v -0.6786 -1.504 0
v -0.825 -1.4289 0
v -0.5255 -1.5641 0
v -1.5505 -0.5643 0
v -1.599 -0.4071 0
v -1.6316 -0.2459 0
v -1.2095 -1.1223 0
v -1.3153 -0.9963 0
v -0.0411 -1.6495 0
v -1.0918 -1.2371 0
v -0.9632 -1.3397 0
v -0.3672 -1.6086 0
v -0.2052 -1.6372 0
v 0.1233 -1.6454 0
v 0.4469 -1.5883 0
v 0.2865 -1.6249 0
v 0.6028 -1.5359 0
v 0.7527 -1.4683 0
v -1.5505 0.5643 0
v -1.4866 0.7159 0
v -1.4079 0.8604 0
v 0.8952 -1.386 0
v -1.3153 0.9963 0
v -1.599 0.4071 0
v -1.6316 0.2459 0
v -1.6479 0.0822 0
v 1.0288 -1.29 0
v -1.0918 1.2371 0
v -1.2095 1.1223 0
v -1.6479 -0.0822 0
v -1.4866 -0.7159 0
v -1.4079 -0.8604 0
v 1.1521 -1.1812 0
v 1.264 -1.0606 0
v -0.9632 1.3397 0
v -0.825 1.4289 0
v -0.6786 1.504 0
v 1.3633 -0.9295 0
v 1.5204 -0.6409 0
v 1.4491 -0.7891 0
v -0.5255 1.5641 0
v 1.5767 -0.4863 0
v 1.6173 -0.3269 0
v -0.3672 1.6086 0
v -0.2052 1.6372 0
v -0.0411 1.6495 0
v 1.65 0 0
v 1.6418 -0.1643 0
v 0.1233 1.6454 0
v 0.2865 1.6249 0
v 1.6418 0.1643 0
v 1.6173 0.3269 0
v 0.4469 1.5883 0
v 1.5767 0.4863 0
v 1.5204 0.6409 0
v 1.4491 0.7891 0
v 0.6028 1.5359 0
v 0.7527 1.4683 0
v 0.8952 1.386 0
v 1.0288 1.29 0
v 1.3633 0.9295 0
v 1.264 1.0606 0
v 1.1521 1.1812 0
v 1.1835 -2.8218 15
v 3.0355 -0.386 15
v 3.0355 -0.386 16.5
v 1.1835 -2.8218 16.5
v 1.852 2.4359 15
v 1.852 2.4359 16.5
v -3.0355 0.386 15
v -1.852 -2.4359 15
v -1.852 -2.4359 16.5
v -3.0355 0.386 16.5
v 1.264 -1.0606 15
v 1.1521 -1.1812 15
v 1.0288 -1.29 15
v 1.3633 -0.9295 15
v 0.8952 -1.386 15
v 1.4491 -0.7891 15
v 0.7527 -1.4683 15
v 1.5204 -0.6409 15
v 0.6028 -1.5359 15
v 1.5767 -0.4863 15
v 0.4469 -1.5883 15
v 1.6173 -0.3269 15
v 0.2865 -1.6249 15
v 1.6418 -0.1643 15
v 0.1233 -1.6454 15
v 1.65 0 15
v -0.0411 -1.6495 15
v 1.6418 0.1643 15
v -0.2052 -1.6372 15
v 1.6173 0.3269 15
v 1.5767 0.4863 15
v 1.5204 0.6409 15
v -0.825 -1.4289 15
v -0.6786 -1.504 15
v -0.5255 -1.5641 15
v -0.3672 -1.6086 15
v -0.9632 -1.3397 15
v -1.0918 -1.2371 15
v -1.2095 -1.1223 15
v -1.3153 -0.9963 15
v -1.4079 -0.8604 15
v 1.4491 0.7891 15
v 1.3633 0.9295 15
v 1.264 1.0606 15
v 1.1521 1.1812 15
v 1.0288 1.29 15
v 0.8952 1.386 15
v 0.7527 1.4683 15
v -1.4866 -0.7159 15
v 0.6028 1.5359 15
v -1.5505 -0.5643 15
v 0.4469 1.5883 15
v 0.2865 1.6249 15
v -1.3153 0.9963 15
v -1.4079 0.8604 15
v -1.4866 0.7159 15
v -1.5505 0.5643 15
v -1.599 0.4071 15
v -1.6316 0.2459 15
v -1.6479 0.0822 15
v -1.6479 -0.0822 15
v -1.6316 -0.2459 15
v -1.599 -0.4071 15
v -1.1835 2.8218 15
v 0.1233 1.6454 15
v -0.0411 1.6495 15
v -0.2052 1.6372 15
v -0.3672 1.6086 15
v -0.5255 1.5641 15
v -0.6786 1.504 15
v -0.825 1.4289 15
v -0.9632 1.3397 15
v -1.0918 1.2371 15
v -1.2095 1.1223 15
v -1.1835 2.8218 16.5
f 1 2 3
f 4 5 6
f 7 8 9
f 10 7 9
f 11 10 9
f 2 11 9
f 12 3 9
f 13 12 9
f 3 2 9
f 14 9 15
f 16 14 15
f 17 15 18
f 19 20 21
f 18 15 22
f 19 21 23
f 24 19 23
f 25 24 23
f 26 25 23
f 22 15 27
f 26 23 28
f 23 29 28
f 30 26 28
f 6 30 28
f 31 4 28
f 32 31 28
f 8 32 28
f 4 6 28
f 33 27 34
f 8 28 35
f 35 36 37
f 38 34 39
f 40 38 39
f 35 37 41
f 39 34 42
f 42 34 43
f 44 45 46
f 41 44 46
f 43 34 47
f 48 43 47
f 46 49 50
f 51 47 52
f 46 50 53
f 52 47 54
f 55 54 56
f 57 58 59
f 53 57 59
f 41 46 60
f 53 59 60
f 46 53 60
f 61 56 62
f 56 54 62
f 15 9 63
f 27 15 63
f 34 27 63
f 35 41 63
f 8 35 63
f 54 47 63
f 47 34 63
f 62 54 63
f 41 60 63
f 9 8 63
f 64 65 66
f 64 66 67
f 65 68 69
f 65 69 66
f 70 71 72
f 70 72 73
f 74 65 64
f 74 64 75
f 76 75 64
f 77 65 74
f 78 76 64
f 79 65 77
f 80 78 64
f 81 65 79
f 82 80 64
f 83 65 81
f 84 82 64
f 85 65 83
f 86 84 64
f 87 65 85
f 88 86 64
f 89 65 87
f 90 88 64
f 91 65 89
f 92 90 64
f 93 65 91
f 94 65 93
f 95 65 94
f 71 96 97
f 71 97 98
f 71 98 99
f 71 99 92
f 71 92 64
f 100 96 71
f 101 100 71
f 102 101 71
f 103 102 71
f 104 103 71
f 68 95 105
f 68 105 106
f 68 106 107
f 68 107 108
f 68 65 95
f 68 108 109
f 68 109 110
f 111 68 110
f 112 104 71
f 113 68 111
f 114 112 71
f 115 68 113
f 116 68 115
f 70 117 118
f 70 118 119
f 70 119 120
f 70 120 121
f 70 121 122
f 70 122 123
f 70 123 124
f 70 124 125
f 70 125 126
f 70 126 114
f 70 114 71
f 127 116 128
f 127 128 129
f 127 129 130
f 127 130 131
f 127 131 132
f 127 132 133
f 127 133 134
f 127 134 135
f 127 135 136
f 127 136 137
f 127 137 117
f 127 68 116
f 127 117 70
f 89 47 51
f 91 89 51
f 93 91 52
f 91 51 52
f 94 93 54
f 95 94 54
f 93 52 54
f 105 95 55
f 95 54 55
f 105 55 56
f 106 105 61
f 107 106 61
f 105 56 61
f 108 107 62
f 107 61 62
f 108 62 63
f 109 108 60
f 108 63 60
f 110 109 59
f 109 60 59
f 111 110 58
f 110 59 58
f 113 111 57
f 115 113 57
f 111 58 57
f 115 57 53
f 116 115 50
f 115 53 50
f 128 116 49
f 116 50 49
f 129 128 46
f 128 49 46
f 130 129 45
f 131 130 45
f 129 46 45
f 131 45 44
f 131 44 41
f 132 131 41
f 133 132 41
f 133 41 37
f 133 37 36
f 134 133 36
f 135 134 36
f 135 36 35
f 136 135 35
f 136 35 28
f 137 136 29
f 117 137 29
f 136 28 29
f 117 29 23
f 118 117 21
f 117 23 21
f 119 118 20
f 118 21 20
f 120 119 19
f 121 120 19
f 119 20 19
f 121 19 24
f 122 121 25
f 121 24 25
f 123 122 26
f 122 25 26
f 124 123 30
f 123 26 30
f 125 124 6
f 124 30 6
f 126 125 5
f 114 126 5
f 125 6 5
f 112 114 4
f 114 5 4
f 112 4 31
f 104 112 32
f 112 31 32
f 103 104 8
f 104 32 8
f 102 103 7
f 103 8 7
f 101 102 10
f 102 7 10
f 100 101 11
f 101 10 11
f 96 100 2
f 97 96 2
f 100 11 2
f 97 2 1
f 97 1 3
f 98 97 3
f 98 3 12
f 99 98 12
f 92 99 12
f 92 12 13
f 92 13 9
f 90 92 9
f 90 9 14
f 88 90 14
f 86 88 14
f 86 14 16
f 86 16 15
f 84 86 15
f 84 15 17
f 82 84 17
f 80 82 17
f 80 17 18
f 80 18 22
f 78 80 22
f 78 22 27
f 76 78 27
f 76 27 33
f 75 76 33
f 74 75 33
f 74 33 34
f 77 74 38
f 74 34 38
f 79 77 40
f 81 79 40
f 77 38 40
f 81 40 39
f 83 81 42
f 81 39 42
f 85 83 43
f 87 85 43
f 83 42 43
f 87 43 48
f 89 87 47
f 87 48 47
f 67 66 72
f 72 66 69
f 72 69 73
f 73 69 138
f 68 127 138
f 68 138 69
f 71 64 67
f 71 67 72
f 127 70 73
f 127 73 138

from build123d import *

# Parameters (mm, degrees)
SKETCH_1_R      = 1.65
EXTRUDE_1_DEPTH = 15
EXTRUDE_2_DEPTH = 1.5


with BuildPart() as part:
    # 스케치1 → 보스-돌출1 (new body)
    with BuildSketch(Plane.XY):
        Circle(SKETCH_1_R)
    extrude(amount=EXTRUDE_1_DEPTH)

    # 스케치2 → 보스-돌출2 (add)
    with BuildSketch(Plane(origin=(0, 0, 15), x_dir=(-1, 0, 0), z_dir=(0, 0, -1))):
        Polygon((1.852010162, -2.435855433), (3.035517766, 0.385960132), (1.183507604, 2.821815565), (-1.852010162, 2.435855433), (-3.035517766, -0.385960132), (-1.183507604, -2.821815565), align=None)
    extrude(amount=-EXTRUDE_2_DEPTH)


solid = part.part
